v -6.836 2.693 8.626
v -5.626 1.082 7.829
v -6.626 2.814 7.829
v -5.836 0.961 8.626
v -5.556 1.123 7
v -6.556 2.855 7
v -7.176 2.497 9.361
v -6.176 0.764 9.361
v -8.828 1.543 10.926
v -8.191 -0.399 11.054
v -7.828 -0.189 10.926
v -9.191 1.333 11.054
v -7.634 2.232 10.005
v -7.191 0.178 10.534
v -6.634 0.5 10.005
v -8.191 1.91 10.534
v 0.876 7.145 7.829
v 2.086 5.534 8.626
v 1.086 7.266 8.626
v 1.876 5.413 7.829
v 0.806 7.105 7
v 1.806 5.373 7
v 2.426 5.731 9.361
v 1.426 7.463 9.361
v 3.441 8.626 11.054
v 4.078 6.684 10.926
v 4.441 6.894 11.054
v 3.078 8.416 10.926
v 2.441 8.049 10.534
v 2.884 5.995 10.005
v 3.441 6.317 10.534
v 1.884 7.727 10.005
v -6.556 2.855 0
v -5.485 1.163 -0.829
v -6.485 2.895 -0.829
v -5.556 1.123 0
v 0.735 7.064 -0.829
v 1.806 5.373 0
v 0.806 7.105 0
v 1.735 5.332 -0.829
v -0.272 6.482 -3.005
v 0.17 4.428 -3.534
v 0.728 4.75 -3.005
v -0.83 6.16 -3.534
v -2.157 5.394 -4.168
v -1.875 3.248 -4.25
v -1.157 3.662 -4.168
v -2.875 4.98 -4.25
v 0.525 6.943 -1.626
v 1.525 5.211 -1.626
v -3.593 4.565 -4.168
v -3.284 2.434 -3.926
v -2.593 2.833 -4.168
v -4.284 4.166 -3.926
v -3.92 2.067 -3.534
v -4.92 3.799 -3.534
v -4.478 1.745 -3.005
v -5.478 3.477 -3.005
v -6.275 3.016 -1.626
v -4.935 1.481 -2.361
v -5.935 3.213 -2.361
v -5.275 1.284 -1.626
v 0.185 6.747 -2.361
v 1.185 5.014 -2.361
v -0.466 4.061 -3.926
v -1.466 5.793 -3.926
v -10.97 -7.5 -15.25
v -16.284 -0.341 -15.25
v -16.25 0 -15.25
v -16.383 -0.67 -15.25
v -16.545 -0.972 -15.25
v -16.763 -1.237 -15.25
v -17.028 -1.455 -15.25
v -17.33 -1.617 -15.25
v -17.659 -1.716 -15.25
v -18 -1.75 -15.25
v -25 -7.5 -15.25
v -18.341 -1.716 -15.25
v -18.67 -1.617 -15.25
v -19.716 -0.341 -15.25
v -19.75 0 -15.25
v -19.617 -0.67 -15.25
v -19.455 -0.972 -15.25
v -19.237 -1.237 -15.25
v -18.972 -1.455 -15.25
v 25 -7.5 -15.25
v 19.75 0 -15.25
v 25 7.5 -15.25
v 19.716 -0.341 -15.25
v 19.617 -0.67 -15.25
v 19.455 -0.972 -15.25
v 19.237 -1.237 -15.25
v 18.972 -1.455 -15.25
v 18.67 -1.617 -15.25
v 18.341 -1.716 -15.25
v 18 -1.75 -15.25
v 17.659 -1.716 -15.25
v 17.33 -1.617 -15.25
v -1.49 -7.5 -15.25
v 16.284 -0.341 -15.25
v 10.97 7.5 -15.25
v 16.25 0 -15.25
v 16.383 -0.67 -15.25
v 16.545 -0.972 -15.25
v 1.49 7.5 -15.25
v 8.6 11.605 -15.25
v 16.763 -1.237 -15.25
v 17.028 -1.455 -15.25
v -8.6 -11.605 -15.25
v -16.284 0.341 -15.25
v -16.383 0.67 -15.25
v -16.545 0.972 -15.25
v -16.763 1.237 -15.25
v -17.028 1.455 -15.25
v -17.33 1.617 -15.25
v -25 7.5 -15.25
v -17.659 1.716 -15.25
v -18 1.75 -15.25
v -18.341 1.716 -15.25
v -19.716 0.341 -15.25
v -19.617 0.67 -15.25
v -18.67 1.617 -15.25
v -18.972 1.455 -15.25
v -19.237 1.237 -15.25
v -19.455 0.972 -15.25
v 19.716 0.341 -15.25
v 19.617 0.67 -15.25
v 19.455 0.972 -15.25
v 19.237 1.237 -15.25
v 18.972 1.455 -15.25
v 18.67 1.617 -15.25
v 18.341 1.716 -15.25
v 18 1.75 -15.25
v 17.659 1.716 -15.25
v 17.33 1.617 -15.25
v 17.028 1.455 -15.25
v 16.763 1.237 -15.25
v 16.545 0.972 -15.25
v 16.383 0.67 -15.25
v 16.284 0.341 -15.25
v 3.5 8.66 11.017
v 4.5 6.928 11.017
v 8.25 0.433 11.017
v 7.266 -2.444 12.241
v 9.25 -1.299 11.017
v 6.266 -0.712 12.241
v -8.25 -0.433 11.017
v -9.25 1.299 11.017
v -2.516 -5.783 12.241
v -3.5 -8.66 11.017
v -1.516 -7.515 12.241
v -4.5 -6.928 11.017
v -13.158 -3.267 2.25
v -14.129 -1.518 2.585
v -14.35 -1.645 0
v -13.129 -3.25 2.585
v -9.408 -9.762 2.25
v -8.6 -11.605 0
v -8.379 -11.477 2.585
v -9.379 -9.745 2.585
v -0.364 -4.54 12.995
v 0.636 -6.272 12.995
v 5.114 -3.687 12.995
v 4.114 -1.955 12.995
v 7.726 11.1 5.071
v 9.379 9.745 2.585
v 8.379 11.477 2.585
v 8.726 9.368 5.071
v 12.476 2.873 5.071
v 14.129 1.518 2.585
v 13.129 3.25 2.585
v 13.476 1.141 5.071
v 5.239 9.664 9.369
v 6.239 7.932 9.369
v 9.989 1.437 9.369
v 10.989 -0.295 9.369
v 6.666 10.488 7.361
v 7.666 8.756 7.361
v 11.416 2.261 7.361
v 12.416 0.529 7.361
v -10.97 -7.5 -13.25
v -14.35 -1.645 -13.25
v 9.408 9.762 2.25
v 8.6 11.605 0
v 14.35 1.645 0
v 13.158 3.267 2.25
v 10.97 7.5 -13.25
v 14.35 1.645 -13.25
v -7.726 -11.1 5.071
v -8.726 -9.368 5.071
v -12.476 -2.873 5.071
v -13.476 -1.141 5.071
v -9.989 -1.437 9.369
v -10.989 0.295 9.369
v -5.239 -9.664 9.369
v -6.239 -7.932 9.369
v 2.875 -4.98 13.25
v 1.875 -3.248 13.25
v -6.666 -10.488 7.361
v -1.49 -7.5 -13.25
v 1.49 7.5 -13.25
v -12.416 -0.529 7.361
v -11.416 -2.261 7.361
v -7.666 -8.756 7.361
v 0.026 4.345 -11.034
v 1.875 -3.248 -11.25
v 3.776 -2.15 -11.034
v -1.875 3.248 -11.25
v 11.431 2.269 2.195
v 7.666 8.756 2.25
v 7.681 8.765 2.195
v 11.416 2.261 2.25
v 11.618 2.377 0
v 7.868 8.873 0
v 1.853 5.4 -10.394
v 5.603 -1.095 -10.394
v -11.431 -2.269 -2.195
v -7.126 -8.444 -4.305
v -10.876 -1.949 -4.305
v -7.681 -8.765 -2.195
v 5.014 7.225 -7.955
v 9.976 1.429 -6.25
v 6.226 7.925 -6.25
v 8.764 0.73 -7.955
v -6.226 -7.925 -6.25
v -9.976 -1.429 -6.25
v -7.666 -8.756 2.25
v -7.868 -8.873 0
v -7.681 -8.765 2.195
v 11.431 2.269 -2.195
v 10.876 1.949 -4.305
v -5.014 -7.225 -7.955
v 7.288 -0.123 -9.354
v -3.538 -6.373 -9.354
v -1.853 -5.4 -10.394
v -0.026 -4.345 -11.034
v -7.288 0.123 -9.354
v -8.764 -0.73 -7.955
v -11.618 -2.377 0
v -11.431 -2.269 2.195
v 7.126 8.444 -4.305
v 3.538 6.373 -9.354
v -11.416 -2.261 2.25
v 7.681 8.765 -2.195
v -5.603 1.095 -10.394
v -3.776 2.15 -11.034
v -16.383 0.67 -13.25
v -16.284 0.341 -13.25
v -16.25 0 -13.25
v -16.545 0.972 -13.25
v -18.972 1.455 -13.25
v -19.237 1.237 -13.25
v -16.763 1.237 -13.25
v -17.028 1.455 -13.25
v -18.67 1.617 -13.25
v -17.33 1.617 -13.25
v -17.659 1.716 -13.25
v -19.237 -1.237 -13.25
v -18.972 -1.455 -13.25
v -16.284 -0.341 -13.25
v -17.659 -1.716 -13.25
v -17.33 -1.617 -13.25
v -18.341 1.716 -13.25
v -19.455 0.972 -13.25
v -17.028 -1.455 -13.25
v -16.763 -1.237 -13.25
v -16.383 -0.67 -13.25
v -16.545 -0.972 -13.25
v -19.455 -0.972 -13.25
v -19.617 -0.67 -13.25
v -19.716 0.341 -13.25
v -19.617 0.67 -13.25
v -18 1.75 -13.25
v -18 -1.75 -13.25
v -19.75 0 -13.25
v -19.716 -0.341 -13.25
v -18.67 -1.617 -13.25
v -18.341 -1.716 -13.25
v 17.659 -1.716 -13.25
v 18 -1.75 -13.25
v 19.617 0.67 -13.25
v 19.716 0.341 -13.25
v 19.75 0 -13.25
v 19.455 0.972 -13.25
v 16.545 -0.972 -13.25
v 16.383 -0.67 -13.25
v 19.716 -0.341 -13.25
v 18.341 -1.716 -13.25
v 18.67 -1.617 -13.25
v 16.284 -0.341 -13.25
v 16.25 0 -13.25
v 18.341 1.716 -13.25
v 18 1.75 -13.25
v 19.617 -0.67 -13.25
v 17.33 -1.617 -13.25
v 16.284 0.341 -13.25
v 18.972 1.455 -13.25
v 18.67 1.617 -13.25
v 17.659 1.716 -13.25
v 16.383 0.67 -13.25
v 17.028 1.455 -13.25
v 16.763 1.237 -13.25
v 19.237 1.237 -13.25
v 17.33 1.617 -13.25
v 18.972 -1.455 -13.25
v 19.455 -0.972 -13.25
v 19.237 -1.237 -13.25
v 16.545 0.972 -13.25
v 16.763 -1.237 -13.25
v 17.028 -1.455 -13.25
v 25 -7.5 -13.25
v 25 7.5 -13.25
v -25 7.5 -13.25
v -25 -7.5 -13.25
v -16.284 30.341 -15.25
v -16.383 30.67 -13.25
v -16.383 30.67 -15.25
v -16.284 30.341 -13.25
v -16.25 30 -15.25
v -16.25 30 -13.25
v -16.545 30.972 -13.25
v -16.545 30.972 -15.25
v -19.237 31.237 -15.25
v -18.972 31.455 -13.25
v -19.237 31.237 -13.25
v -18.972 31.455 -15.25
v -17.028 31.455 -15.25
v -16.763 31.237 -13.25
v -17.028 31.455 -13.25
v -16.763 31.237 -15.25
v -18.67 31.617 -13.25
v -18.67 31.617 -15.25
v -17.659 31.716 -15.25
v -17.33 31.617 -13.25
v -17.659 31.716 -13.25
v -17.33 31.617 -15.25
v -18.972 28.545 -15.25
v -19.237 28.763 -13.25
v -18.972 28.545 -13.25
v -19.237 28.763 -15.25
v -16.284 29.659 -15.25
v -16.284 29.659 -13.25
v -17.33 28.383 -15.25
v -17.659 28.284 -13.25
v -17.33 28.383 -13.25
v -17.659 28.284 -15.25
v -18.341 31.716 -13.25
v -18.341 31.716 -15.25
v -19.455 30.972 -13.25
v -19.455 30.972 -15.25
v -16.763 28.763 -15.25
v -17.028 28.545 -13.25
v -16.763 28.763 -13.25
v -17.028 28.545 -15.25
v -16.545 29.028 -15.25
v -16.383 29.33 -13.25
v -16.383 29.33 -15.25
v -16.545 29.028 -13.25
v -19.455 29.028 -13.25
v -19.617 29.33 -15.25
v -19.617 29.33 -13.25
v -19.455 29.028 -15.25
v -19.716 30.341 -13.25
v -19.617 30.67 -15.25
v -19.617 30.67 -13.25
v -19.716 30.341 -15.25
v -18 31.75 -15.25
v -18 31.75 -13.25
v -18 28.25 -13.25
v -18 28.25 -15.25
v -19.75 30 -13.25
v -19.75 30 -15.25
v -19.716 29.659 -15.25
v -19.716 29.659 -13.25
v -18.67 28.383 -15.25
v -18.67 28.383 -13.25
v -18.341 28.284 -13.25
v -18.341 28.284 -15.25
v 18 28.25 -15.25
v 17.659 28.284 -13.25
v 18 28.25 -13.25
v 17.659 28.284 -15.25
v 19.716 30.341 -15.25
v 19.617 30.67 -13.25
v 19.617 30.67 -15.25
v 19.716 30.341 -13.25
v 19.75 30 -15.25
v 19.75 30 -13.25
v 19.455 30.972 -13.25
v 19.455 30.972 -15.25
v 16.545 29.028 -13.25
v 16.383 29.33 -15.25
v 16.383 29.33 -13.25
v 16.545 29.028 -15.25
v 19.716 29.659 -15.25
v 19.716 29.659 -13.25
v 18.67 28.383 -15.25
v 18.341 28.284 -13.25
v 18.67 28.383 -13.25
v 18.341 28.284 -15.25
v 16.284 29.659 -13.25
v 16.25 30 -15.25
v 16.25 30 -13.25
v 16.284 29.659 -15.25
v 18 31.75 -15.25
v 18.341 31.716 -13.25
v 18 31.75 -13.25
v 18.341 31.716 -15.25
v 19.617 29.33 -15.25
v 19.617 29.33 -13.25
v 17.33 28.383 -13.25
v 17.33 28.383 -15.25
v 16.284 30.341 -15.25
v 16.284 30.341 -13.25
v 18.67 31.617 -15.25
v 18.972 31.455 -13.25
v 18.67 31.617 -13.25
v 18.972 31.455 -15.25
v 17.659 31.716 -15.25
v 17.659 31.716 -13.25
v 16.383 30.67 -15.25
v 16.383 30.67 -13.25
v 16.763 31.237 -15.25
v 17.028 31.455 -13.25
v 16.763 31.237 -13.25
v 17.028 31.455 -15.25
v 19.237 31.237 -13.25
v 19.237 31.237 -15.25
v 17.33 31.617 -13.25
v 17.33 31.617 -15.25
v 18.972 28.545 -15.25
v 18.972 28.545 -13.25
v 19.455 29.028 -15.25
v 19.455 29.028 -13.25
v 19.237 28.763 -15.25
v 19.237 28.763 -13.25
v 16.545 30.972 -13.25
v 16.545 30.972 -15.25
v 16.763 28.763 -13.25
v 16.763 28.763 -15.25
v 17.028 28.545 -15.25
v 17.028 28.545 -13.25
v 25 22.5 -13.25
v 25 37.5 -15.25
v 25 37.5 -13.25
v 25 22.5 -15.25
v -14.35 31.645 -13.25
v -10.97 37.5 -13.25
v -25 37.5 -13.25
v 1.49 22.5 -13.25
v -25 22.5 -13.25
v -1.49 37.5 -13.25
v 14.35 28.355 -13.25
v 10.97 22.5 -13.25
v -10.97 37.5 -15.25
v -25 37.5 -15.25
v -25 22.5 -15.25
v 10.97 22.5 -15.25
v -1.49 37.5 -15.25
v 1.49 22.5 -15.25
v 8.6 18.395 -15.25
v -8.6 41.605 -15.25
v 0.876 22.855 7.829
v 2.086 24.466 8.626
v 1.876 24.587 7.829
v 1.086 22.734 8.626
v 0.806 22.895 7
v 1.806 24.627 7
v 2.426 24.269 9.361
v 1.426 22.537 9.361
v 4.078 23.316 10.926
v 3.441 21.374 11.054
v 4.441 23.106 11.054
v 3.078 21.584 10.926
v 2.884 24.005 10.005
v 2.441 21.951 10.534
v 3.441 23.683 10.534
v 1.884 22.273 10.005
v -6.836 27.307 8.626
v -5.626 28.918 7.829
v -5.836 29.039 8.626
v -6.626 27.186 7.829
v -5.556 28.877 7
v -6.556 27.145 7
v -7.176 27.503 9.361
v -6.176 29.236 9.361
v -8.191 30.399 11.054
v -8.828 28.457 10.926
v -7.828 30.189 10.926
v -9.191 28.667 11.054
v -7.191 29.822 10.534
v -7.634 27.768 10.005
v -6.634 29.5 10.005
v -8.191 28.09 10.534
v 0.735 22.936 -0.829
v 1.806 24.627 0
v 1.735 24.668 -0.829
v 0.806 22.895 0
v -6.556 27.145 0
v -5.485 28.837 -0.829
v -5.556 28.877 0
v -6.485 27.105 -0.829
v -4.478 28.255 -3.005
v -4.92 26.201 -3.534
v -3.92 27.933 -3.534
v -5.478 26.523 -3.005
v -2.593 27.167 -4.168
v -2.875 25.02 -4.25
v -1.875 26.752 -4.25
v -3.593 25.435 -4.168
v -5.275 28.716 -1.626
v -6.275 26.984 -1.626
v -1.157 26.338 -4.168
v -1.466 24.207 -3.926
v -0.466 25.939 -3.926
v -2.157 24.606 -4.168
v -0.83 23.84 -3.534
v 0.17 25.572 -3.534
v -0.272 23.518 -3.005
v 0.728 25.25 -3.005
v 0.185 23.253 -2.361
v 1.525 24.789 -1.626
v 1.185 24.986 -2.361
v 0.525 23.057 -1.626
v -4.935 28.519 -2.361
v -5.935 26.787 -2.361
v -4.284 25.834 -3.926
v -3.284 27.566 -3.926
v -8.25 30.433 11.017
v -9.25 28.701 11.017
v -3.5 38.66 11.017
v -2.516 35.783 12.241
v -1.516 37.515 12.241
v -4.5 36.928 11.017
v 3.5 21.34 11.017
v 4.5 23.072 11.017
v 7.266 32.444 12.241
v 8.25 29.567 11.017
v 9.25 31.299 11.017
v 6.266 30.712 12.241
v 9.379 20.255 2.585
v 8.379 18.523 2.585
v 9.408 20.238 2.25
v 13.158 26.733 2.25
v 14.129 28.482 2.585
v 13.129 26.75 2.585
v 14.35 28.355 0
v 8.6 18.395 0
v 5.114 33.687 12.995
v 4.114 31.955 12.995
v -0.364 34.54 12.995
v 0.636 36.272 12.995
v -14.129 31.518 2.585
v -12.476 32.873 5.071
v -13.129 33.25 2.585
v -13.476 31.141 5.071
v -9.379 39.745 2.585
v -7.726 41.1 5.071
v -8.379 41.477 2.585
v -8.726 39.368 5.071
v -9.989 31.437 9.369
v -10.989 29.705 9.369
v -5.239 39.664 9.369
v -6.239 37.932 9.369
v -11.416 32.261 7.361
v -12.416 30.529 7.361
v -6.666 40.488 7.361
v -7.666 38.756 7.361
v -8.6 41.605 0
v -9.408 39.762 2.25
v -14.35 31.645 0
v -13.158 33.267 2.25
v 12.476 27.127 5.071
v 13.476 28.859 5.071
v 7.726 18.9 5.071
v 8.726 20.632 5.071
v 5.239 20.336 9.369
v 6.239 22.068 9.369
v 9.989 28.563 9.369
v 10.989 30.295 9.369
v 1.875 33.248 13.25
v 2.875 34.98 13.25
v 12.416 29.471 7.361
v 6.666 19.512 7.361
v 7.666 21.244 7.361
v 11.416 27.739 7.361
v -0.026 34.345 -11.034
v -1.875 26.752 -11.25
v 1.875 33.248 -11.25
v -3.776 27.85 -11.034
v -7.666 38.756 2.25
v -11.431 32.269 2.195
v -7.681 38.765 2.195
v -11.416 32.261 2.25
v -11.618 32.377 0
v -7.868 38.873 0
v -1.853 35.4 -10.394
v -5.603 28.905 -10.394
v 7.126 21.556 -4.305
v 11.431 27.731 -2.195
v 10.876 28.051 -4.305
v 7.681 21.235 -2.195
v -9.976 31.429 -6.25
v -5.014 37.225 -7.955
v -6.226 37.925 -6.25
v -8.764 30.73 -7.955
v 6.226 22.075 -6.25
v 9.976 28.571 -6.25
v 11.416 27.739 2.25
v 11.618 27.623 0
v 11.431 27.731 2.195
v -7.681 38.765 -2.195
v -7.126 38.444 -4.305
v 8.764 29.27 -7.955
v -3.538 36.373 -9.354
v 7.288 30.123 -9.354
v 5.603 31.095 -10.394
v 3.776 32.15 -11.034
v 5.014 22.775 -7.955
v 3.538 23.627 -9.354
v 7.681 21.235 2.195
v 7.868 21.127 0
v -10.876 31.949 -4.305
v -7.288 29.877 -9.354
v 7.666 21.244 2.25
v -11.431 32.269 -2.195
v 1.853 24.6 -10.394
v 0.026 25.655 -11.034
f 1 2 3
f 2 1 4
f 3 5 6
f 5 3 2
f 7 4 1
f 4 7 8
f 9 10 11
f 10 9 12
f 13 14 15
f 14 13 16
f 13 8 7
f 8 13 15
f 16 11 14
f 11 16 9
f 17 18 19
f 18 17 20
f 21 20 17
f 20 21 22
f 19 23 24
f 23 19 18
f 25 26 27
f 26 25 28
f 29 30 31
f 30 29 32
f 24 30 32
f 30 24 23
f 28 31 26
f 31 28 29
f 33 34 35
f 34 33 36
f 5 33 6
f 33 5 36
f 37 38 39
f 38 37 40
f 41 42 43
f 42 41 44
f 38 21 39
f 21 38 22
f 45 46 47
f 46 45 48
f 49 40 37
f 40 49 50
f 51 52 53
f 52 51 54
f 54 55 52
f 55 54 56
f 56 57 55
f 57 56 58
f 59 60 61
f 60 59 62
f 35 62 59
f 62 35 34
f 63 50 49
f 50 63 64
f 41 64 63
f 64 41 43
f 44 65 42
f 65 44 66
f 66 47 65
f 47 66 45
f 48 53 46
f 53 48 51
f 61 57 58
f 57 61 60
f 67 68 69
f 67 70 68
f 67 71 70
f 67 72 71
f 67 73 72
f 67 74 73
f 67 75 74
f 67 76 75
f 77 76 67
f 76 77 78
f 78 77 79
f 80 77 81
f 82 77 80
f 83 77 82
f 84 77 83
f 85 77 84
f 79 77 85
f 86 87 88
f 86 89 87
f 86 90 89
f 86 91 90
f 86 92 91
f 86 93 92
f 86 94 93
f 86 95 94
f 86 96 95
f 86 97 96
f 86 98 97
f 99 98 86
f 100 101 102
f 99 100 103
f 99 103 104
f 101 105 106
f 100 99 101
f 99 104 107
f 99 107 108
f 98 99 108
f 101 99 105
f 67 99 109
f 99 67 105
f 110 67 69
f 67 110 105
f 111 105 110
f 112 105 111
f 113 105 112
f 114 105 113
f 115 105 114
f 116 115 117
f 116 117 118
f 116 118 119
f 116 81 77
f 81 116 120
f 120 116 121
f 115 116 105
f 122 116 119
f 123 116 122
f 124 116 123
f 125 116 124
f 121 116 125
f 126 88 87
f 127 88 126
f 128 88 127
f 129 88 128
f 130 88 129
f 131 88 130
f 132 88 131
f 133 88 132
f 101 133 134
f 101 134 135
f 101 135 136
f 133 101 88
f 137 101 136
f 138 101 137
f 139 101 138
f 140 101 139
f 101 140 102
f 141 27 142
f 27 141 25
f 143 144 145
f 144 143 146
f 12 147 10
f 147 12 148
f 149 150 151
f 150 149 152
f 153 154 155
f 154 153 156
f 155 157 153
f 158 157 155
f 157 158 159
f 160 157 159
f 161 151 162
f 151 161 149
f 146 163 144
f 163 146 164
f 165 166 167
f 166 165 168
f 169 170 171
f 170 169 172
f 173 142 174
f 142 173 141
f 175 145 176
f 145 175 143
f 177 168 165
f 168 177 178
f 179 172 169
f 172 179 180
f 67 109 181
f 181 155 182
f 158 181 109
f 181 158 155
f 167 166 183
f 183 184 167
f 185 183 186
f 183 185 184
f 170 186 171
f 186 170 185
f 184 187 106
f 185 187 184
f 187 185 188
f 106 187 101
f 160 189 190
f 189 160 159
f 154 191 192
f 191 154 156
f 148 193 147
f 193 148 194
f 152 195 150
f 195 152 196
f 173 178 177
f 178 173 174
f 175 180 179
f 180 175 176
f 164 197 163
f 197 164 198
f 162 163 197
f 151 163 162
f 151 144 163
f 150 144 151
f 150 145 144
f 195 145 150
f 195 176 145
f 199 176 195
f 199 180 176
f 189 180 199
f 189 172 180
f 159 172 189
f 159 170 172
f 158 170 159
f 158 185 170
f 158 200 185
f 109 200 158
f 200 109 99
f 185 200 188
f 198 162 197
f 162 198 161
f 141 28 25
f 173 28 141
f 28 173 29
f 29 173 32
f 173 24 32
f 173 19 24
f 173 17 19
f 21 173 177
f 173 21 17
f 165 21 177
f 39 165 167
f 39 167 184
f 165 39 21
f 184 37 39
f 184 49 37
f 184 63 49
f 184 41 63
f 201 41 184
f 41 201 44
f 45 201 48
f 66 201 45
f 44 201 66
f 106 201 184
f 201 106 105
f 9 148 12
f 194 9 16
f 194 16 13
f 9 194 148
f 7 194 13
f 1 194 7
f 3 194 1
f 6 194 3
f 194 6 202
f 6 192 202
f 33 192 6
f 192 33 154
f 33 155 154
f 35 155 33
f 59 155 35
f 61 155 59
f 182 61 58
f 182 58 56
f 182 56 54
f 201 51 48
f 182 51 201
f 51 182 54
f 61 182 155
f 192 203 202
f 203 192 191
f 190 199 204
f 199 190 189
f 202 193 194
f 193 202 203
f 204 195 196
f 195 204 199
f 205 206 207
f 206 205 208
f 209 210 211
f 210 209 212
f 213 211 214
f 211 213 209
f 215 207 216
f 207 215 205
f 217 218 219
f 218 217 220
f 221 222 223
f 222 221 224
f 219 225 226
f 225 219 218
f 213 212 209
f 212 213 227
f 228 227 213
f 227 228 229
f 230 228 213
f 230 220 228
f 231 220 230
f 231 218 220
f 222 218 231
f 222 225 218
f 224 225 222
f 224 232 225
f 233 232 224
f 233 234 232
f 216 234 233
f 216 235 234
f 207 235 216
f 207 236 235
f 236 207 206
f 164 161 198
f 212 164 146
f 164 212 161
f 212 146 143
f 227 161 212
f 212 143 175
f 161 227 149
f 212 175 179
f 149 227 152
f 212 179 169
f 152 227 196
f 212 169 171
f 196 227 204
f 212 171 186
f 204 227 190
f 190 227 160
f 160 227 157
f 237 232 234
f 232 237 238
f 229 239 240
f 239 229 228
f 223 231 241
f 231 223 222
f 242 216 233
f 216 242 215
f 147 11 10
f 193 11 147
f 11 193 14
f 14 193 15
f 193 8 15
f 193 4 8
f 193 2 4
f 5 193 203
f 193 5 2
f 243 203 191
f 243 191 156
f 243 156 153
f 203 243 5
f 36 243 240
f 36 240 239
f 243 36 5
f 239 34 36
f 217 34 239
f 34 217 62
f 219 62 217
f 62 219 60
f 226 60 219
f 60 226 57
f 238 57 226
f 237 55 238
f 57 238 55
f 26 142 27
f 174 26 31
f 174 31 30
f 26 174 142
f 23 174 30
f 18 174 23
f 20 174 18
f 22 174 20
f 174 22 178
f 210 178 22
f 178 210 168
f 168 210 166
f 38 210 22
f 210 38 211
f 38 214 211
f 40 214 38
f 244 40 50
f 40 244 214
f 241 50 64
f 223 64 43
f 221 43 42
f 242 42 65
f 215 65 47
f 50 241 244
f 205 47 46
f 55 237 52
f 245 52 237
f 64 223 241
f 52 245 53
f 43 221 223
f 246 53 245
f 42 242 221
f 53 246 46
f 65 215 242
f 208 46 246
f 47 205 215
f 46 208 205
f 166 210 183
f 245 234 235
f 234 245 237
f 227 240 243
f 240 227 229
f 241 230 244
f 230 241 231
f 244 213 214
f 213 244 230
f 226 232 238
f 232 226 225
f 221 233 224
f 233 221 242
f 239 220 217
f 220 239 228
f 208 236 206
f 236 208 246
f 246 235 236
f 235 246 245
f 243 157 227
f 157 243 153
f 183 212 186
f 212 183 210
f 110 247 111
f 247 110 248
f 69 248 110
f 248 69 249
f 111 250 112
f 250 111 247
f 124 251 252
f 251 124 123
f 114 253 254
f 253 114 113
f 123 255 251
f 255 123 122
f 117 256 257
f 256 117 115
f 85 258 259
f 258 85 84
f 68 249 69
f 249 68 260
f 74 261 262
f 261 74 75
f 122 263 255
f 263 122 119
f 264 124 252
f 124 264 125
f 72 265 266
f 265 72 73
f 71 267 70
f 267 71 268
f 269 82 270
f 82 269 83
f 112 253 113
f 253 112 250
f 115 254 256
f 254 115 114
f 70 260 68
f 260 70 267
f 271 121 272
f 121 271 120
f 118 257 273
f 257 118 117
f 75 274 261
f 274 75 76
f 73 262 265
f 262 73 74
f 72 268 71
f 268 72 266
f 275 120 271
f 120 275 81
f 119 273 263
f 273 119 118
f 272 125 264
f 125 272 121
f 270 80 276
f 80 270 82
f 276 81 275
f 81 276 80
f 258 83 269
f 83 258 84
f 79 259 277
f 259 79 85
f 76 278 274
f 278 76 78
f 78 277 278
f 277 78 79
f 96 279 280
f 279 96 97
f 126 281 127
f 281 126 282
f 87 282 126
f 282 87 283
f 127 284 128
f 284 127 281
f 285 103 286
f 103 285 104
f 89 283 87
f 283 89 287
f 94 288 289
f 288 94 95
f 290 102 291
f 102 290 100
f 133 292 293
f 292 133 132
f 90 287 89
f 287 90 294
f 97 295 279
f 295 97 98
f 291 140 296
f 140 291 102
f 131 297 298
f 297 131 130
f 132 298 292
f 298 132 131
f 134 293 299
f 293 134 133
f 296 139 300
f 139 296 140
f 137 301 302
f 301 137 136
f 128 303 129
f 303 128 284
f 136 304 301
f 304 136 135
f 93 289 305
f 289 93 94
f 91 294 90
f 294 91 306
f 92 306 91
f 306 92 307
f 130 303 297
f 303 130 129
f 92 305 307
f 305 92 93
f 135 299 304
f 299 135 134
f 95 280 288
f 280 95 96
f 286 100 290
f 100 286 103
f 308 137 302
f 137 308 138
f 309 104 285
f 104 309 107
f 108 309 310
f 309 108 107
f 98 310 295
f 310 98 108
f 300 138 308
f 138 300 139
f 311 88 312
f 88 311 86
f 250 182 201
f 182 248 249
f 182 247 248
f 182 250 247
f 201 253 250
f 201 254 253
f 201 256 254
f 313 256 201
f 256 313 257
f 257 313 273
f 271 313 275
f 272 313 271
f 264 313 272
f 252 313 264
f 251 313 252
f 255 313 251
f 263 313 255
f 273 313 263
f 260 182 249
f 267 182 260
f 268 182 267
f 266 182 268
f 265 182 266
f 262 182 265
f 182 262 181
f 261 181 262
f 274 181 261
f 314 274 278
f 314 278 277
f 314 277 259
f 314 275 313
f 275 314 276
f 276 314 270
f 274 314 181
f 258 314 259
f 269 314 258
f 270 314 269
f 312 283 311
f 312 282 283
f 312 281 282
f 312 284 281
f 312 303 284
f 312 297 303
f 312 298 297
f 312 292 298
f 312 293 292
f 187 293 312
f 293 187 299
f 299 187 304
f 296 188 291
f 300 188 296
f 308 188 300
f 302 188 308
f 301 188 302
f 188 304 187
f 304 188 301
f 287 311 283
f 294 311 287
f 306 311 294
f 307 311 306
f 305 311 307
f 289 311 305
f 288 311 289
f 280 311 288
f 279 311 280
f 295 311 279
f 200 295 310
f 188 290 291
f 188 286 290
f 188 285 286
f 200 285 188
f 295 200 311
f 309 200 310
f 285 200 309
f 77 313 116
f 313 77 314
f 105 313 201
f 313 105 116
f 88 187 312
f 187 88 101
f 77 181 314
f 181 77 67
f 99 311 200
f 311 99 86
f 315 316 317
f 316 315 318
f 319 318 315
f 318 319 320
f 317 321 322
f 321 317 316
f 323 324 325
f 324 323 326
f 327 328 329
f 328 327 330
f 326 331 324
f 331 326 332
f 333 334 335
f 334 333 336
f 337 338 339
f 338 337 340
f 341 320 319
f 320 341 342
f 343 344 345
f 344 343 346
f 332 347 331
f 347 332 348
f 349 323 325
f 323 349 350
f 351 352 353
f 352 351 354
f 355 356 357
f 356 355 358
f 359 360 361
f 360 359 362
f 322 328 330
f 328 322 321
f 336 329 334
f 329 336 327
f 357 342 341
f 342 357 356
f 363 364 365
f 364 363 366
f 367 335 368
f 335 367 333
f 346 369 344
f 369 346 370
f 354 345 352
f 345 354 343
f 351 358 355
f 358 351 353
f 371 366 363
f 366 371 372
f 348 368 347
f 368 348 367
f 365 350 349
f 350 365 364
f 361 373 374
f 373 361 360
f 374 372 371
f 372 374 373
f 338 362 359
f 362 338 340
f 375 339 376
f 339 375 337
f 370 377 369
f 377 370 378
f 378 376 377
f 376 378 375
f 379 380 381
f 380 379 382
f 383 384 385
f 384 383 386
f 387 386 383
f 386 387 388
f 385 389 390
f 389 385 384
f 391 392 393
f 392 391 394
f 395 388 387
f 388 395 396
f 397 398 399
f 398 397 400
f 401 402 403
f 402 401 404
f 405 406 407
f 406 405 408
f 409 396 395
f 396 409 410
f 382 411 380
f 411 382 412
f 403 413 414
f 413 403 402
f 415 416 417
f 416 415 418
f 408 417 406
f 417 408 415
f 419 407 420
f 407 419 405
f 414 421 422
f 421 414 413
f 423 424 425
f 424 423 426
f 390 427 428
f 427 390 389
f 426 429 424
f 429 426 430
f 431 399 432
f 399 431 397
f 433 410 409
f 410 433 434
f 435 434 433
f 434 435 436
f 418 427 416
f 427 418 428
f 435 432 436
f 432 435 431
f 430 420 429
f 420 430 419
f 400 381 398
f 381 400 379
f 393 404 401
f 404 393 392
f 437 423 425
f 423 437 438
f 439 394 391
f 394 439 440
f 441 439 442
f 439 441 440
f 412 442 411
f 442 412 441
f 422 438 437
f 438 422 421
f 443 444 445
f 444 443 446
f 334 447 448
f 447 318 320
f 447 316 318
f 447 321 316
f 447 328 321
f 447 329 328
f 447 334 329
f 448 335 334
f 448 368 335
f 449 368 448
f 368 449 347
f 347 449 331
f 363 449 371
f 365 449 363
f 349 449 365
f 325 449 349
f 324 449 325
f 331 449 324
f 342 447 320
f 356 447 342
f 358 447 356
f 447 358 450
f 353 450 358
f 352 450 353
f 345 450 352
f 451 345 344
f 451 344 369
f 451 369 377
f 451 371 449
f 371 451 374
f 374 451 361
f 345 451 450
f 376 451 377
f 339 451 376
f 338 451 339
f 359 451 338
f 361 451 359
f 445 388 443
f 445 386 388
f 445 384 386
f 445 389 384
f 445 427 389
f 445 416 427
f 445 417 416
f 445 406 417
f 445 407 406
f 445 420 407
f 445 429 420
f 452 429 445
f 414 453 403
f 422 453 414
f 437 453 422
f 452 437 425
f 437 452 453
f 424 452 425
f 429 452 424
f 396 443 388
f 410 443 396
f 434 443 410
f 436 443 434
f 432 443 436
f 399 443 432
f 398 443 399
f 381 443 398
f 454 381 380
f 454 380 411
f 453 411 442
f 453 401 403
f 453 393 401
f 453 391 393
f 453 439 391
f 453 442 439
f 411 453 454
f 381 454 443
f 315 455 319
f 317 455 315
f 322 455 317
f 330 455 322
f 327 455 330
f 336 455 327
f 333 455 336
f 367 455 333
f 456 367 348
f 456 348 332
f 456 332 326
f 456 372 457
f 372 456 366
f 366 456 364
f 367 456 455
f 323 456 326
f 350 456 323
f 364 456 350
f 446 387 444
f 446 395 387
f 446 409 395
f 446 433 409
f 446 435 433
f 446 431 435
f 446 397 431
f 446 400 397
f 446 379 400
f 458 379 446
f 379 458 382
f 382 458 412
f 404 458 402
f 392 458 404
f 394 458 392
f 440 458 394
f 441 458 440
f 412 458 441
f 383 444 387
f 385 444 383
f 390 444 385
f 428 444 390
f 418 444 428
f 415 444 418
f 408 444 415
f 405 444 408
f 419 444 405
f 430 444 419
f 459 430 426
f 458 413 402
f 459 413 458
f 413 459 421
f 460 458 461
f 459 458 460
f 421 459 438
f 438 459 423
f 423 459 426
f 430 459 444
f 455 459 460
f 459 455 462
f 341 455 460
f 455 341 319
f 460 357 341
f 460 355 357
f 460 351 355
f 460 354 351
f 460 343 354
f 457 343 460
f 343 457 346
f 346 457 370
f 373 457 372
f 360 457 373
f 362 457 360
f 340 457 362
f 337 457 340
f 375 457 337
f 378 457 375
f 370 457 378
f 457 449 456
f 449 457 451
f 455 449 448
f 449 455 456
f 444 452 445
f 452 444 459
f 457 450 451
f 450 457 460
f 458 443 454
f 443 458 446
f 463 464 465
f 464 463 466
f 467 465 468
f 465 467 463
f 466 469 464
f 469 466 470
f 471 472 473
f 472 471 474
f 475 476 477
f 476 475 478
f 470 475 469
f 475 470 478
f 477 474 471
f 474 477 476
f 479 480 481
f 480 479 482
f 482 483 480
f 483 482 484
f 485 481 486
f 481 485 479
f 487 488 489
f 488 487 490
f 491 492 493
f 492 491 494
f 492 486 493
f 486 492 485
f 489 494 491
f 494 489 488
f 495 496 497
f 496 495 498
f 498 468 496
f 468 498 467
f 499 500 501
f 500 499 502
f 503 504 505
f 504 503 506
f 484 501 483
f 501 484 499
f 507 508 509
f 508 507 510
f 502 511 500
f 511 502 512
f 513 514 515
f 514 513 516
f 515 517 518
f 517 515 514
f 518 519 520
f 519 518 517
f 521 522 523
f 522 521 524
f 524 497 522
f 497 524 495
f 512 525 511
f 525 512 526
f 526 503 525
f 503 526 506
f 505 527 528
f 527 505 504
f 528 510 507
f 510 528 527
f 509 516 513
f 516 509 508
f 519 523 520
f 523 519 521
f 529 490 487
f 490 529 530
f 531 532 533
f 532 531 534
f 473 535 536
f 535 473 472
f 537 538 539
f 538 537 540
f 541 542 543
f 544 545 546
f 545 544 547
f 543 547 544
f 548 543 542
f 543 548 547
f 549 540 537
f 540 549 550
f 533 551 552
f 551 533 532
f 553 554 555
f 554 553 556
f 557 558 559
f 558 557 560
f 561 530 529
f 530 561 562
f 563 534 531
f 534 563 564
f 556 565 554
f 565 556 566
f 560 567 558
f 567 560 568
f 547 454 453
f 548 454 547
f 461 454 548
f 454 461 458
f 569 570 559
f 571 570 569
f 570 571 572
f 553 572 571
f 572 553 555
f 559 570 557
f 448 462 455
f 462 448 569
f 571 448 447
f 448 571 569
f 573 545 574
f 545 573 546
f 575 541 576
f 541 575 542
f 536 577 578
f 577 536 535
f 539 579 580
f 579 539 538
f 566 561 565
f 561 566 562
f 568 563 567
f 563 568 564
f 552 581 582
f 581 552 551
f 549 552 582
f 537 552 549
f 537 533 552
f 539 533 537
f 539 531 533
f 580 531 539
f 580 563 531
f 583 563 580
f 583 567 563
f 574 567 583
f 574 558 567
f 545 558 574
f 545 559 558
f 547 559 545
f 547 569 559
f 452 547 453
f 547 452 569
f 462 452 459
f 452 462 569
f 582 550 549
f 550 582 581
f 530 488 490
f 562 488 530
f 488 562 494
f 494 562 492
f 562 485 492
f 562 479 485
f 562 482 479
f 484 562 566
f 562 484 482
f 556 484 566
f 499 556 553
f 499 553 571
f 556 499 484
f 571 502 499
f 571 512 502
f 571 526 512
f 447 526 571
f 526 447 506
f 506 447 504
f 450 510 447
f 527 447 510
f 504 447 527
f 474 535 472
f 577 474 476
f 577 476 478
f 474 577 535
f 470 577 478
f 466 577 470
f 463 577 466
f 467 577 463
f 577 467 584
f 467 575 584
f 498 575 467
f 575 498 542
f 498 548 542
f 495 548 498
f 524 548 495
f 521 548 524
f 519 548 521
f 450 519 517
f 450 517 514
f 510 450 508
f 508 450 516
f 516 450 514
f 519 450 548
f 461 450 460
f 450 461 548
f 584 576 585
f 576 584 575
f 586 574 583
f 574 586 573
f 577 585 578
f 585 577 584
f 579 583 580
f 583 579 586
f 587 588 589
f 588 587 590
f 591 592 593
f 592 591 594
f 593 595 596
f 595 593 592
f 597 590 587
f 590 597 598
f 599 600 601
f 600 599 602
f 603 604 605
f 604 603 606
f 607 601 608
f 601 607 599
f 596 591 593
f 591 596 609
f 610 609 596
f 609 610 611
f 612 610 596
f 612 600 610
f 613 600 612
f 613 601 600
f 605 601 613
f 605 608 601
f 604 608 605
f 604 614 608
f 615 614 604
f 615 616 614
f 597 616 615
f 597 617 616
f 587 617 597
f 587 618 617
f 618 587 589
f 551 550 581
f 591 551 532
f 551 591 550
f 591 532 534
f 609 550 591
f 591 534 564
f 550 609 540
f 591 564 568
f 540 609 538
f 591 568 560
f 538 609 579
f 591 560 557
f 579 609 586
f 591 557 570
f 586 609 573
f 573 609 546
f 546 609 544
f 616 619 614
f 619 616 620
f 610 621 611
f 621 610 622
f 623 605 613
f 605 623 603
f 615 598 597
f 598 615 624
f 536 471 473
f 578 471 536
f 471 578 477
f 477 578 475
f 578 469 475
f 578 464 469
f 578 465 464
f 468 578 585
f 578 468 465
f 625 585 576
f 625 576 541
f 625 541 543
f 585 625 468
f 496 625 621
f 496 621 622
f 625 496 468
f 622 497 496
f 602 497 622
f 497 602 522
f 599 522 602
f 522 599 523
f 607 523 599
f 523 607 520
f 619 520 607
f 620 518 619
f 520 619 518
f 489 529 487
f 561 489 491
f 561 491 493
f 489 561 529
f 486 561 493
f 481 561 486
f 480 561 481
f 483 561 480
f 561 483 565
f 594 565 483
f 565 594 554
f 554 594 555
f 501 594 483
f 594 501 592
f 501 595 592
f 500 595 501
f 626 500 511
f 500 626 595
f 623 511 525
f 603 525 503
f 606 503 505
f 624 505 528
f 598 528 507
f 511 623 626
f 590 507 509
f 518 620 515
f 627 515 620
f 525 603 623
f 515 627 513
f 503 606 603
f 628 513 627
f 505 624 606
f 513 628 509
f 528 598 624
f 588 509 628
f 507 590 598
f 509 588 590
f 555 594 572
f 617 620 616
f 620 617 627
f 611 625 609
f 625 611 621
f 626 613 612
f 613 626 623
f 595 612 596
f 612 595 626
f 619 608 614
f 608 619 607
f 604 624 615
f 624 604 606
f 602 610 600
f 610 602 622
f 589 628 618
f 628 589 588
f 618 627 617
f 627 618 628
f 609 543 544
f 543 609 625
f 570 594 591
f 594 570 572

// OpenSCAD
// file: bearing_holder.scad
$fn = 32;

cutting_epsilon = 0.01;

module cutout_rounding_cutter(rounding = 5, height = 10) {
	difference() {
		// take a cylinder out of a cube to get a cutter that can cut
		// bevels
		cube([rounding, rounding, height], center = true);
		translate([-rounding/2, -rounding/2, 0])
			cylinder(d = rounding, h = height + 2*cutting_epsilon, center = true);
	}
}

module shaft_cutout_cutter(width, diameter, slot_height = 0,
		rounding = 0, rounding_height = 0) {
	// cutout for shaft
	hull() {
		cylinder(h = width, d = diameter, center = true);
		if (slot_height > 0) {
			translate([0, slot_height, 0])
				cube([diameter, 1, width], center = true);
		}
	}

	// round the cutout for the shaft
	if (slot_height > 0 && rounding > 0) {
		rounding_height = rounding_height == -1 ? slot_height : rounding_height;
		translate([0, rounding_height, 0]) {
			translate([-rounding/2, 0, 0])
				cutout_rounding_cutter(rounding, width);
			translate([rounding/2, 0, 0])
				mirror([1, 0, 0])
					cutout_rounding_cutter(rounding, width);
		}
	}
}

module bearing_holder(outer_diameter = 22, width = 7, thickness = 2,
		clip_cutting_factor = 0.1, shaft_diameter = 8,
		bottom_shaft_hole = true, top_shaft_hole = true,
		bottom_shaft_slot = true, top_shaft_slot = true,
		shaft_slots_rounded = true,
		epsilon = 0.25) {
	cw = width + 2*epsilon;
	cod = outer_diameter + 2*epsilon;
	csd = shaft_diameter + 2*epsilon;

	diameter_overall = cod + 2*thickness;
	width_overall = cw + 2*thickness;
	clip_cutting_pos = cod * clip_cutting_factor;
	difference() {
		// flow holder and socket into each other
		hull() {
			// outer casing for holding the bearing
			cylinder(h = width_overall, d = diameter_overall, center = true);

			// socket that is one thickness thick and overall
			// diameter and it's own thickness below the holder
			translate([0, -diameter_overall/2 - thickness/2, 0])
				cube([diameter_overall, thickness, width_overall], center = true);
		}

		// cutout the size of the actual bearing
		#cylinder(h = cw, d = cod, center = true);

		// cutout so that bearing can be clipped into holder
		clip_cutter_height = diameter_overall / 2;
		translate([0, clip_cutter_height / 2 + clip_cutting_pos, 0])
			cube([diameter_overall, clip_cutter_height, cw],
				center = true);

		shaft_slot_height = diameter_overall/2;
		shaft_slot_rounding = shaft_slots_rounded ? csd : 0;
		shaft_slot_rounding_height = cod/2;
		if (bottom_shaft_hole) {
			bottom_shaft_slot_height = bottom_shaft_slot ? shaft_slot_height : 0;
			translate([0, 0, -width_overall/2 + thickness/2])
				shaft_cutout_cutter(width = thickness + 2*cutting_epsilon,
					diameter = csd,
					slot_height = bottom_shaft_slot_height,
					rounding = shaft_slot_rounding,
					rounding_height = shaft_slot_rounding_height);
		}

		if (top_shaft_hole) {
			top_shaft_slot_height = top_shaft_slot ? shaft_slot_height : 0;
			translate([0, 0, width_overall/2 - thickness/2])
				shaft_cutout_cutter(width = thickness + 2*cutting_epsilon,
					diameter = csd,
					rounding = shaft_slot_rounding,
					slot_height = top_shaft_slot_height,
					rounding = shaft_slot_rounding,
					rounding_height = shaft_slot_rounding_height);
		}
	}
}

bearing_holder();
// main file
$fn = 32;
use <bearing_holder.scad>;

cutting_epsilon = 0.01;

module socket(width = 15, length = 30, thickness = 2,
		screw_size = 3, epsilon = 0.25) {
	difference() {
		cube([length, width, thickness], center = true);

		if (screw_size > 0) {
			css = screw_size + 2*epsilon;
			cutting_height = thickness + 2 * cutting_epsilon;
			translate([-length/2 + css * 2, 0, 0])
				cylinder(d = css, h = cutting_height, center = true);
			translate([length/2 - css * 2, 0, 0])
				cylinder(d = css, h = cutting_height, center = true);
		}
	}
}

module spool_holder(thickness = 2,
		socket_width = 15, socket_length = 50,
		holder_angle = 30,
		bearing_diameter = 22, bearing_width = 7, shaft_diameter = 8,
		screw_size = 3,
		epsilon = 0.25) {
	union() {
		rotate([90, 0, holder_angle])
			bearing_holder(outer_diameter = bearing_diameter,
				width = bearing_width,
				thickness = thickness,
				shaft_diameter = shaft_diameter,
				top_shaft_hole = false,
				epsilon = epsilon);

		// put socket below holder, holder extends half of bearing
		// diameter plus epsilon plus two thicknesses below center,
		// socket is also centered, so we have to move it down 2.5
		// thicknesses, but we go up once thickness to have holder and
		// socket start on the build plate.
		translate([0, 0, -bearing_diameter/2 - epsilon - 1.5*thickness])
			socket(width = socket_width,
				length = socket_length,
				thickness = thickness,
				screw_size = screw_size,
				epsilon = epsilon);
	}
}

spool_holder();
// spin second holder by 180 degrees to get shaft cutout on inner side
translate([0, 30, 0])
	spool_holder(holder_angle = 180 - 30);
